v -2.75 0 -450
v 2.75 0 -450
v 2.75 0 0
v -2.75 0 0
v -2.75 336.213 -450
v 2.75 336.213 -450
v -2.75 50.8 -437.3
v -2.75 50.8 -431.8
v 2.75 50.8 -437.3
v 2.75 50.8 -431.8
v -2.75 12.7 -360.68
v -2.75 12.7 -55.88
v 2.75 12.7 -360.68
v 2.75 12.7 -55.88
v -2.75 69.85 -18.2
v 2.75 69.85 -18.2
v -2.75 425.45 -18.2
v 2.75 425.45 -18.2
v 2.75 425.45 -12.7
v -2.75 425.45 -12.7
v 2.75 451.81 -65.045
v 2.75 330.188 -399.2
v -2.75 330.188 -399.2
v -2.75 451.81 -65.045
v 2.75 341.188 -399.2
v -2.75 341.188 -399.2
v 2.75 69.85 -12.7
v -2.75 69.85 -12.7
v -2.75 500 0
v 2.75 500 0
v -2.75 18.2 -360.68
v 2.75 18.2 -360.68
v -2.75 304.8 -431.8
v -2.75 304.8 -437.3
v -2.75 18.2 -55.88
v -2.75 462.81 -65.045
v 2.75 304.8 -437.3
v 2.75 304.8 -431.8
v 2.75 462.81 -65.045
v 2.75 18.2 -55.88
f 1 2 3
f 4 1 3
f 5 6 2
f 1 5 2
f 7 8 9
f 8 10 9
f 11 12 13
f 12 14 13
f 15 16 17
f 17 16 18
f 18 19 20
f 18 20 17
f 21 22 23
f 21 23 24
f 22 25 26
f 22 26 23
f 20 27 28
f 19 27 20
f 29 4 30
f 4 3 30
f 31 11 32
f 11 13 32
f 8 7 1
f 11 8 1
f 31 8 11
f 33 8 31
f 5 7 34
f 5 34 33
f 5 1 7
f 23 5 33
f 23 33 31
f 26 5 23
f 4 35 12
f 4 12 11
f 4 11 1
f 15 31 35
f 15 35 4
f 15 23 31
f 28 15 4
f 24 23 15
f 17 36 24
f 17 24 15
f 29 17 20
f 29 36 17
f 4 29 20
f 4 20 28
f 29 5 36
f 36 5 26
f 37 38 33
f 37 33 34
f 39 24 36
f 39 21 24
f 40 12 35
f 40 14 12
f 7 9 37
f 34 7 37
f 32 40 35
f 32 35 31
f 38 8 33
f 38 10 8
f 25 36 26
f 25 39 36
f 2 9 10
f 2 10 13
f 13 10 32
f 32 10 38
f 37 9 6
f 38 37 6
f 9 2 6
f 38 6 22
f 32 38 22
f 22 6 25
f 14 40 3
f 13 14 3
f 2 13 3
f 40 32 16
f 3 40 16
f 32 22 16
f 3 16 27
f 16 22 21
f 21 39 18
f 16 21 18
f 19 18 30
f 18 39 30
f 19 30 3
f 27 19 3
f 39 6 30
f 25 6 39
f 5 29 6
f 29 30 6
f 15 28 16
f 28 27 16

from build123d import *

# Parameters (mm, degrees)
CROQUIS1_W              = 304.8
CROQUIS1_H              = 5.5
CROQUIS1_W_2            = 5.5
CROQUIS1_H_2            = 355.6
CROQUIS1_H_3            = 254
SALIENTE_EXTRUIR1_DEPTH = 2.75


with BuildPart() as part:
    # Croquis1 → Saliente-Extruir1 (new, symmetric)
    with BuildSketch(Plane(origin=(0, 0, 0), x_dir=(0, 0, -1), z_dir=(1, 0, 0))):
        Polygon((450, 0), (0, 0), (0, 500), (450, 336.21339458), align=None)
        Polygon((65.045304049, 462.810387737), (399.2, 341.18802477), (399.2, 330.18802477), (65.045304049, 451.810387737), align=None, mode=Mode.SUBTRACT)
        with Locations((208.28, 15.45)):
            Rectangle(CROQUIS1_W, CROQUIS1_H, mode=Mode.SUBTRACT)
        with Locations((15.45, 247.65)):
            Rectangle(CROQUIS1_W_2, CROQUIS1_H_2, mode=Mode.SUBTRACT)
        with Locations((434.55, 177.8)):
            Rectangle(CROQUIS1_W_2, CROQUIS1_H_3, mode=Mode.SUBTRACT)
    extrude(amount=SALIENTE_EXTRUIR1_DEPTH, both=True)


solid = part.part
